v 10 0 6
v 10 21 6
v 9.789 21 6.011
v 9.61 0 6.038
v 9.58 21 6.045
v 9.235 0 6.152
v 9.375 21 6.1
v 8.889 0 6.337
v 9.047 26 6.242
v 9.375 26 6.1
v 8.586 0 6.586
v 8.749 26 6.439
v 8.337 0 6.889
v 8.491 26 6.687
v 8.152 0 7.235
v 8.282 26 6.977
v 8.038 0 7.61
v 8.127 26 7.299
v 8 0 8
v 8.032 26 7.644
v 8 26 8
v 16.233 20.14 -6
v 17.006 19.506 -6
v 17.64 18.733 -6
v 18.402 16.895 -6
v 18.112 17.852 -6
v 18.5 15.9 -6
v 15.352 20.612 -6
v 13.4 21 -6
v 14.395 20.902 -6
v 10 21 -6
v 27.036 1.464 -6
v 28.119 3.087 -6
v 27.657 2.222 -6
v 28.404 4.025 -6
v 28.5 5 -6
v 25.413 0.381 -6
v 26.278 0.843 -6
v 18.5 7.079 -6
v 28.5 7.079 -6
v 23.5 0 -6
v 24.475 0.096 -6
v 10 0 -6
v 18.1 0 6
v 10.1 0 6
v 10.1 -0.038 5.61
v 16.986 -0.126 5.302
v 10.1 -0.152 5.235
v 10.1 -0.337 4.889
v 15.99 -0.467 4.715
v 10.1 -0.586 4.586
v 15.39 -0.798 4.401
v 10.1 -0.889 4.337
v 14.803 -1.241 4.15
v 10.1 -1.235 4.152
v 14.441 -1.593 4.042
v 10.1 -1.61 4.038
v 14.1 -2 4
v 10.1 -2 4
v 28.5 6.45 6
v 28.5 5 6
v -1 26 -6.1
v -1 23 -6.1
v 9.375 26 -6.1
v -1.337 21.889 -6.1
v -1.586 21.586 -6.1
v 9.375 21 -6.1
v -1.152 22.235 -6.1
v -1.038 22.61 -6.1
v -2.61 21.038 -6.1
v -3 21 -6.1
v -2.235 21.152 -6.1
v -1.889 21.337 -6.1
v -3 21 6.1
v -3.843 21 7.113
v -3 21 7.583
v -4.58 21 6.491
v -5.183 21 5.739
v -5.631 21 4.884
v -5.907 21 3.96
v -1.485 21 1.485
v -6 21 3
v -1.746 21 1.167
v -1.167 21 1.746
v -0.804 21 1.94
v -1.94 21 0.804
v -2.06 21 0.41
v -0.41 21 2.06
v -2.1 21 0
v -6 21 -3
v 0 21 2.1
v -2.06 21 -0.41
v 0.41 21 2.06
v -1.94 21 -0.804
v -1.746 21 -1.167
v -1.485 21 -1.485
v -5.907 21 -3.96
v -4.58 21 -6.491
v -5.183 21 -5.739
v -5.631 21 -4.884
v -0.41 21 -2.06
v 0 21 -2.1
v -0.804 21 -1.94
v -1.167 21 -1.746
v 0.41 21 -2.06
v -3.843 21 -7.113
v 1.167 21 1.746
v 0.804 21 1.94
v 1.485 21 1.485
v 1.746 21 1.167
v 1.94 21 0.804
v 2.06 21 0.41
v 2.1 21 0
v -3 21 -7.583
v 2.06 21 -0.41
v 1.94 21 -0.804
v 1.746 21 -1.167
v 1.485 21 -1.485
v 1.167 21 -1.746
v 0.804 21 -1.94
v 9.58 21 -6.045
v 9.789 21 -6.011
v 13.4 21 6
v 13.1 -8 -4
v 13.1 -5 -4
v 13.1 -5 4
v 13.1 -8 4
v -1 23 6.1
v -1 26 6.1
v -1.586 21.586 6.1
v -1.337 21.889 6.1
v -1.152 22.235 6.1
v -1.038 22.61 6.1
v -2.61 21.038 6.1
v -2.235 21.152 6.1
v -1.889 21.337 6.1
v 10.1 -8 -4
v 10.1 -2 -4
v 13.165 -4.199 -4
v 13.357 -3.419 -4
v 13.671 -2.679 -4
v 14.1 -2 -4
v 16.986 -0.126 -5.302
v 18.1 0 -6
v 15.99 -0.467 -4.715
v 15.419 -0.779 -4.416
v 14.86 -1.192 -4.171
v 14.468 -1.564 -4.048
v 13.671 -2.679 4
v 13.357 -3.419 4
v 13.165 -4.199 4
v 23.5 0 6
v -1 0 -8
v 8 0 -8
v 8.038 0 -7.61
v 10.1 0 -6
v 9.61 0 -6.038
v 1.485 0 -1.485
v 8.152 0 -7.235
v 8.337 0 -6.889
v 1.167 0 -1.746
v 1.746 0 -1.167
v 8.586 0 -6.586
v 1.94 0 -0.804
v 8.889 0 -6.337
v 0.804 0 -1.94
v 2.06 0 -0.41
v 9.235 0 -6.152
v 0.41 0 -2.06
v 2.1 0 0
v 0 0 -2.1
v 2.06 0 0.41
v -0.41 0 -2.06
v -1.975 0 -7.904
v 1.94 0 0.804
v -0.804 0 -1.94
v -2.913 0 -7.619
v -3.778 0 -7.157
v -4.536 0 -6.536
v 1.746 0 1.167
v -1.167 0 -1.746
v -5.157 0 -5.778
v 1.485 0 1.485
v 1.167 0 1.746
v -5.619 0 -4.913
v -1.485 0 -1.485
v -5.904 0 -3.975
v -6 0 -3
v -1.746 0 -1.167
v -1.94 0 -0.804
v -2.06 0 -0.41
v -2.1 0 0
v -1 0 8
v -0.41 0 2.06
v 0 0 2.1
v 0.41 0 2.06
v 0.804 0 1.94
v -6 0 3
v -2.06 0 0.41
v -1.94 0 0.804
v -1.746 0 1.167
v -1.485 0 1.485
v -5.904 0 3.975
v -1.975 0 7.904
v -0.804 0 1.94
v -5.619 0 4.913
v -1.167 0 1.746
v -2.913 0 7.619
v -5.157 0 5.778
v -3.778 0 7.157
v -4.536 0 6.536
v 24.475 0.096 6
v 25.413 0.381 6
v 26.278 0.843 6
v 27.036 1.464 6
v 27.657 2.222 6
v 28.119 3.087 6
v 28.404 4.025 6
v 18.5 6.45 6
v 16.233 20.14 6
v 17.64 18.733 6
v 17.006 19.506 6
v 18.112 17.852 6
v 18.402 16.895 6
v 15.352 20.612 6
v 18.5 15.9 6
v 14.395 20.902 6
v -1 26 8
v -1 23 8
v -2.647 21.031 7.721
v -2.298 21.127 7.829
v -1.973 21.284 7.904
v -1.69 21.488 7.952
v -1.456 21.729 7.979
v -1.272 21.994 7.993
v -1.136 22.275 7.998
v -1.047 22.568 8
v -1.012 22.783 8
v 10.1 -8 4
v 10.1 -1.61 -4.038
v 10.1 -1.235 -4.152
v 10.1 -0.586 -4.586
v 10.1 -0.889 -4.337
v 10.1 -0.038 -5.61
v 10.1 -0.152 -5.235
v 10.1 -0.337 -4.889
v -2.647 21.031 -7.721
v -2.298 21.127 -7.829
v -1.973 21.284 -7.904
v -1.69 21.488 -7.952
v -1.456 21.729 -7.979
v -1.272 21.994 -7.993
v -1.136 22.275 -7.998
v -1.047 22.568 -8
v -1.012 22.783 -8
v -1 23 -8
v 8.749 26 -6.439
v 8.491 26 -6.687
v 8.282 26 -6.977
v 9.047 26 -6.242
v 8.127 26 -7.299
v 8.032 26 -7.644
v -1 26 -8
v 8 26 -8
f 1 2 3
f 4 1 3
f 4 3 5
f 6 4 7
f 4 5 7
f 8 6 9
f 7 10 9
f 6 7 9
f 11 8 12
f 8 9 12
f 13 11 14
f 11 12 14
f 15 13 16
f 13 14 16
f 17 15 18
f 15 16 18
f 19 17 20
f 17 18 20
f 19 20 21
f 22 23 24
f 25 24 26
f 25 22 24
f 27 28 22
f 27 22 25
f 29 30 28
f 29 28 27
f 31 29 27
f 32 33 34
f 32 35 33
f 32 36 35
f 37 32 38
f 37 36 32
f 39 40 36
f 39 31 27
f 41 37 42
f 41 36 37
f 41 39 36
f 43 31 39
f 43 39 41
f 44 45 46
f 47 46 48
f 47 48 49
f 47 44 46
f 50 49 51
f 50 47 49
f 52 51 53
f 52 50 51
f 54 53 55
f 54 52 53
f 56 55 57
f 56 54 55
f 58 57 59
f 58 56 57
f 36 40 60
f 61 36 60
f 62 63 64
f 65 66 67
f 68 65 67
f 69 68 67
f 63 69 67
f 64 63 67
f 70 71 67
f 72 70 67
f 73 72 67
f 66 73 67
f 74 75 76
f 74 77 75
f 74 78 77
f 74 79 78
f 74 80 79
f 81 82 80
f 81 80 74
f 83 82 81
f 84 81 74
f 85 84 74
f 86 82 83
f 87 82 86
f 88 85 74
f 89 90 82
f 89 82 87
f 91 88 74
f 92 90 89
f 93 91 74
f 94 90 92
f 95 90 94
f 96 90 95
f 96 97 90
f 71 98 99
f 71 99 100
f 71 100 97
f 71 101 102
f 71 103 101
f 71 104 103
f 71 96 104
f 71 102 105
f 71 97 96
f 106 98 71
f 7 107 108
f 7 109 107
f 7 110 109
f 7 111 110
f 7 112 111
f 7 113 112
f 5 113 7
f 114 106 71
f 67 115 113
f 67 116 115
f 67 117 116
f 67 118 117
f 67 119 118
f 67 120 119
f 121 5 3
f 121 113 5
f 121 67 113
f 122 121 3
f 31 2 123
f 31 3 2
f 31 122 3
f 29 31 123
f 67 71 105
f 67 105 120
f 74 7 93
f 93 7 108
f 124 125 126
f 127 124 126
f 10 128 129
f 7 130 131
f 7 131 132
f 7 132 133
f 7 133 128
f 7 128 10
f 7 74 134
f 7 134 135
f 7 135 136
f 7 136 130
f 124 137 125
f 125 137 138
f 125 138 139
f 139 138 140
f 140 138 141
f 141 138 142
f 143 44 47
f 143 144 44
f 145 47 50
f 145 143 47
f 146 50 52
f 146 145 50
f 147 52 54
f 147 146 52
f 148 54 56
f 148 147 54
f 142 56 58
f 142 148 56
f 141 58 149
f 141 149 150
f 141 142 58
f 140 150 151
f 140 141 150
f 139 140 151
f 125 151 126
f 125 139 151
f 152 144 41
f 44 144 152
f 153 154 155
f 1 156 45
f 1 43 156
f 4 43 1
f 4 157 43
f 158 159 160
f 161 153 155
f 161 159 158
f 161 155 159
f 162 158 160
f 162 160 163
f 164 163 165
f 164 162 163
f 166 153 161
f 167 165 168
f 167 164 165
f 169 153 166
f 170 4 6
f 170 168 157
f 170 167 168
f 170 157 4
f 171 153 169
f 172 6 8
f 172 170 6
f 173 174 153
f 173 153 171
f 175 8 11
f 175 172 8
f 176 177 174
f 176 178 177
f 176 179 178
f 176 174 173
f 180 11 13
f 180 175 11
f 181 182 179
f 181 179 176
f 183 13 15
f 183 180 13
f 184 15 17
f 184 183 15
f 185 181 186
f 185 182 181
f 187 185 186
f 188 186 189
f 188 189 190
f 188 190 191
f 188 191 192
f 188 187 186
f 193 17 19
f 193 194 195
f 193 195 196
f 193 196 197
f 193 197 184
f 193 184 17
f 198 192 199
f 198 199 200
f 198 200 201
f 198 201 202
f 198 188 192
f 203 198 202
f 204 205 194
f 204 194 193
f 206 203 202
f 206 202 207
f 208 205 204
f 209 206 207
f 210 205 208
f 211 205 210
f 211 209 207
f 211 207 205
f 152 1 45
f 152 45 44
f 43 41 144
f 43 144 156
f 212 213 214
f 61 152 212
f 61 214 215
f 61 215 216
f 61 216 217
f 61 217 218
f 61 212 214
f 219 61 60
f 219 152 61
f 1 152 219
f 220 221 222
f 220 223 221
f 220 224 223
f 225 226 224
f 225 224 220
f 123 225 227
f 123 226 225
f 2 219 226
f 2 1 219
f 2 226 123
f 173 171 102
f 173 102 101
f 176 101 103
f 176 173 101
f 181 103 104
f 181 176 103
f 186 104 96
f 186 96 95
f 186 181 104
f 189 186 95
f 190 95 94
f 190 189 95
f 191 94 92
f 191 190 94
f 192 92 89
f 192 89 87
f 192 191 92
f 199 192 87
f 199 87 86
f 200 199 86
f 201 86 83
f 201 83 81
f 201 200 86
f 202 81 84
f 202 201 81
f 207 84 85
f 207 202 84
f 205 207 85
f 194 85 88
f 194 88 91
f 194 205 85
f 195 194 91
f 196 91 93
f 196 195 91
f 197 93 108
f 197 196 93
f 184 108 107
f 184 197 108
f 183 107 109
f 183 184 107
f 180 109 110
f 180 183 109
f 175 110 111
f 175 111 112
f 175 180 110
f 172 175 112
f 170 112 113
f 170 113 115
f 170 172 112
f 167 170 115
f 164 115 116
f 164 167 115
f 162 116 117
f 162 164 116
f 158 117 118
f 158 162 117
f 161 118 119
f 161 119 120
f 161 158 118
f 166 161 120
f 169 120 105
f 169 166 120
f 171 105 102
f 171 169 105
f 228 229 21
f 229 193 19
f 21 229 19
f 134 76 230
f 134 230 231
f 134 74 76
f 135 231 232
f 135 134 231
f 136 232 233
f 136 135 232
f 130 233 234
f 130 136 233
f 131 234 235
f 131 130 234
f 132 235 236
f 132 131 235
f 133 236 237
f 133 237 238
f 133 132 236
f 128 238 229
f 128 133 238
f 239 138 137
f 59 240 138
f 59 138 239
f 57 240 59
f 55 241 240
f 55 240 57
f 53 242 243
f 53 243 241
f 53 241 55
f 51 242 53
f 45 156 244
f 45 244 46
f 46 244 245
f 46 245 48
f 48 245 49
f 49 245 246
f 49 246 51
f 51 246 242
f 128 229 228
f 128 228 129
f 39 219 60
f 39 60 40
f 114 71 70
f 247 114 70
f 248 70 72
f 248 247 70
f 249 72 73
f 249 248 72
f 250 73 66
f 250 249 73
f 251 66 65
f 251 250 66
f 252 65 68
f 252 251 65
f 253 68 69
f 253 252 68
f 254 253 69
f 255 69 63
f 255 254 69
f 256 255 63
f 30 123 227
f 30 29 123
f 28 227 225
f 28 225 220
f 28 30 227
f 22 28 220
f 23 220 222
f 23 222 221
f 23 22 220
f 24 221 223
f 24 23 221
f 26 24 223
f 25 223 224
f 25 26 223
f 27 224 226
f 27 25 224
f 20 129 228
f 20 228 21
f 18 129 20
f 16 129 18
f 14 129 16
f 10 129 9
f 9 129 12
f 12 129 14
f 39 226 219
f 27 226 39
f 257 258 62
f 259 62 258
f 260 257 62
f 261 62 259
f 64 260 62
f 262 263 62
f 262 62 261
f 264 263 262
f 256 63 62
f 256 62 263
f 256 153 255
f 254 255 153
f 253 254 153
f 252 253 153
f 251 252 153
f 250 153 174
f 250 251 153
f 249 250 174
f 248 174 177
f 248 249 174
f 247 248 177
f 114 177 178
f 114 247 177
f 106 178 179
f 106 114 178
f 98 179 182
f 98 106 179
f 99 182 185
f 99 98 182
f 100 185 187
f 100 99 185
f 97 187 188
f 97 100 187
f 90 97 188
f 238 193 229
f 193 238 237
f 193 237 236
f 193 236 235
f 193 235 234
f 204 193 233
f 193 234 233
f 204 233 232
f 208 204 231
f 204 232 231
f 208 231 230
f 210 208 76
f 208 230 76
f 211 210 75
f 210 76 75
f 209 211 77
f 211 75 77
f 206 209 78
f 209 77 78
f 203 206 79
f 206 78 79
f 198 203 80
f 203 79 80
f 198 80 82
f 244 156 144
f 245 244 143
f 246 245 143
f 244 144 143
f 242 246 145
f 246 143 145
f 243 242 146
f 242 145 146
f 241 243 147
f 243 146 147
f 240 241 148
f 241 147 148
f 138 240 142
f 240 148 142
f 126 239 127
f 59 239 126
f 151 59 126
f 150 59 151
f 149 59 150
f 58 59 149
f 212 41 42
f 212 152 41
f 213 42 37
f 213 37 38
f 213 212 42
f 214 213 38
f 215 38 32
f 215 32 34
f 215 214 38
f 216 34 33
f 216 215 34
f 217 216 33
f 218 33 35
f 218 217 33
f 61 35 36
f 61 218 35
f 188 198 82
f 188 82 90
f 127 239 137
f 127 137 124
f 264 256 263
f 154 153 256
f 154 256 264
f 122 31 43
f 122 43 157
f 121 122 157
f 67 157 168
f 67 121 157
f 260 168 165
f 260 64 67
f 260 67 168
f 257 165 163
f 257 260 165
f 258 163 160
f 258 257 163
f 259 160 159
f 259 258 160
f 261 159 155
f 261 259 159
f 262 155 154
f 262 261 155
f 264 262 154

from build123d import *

# Parameters (mm, degrees)
SKETCH1_W           = 12
SKETCH1_H           = 16
SKETCH1_R           = 2.1
SKETCH1_W_2         = 2
BOSS_EXTRUDE1_DEPTH = 21
FILLET1_R           = 5
SKETCH2_W           = 9
SKETCH2_H           = 1.9
BOSS_EXTRUDE2_DEPTH = 5
SKETCH4_W           = 12
SKETCH4_H           = 21
BOSS_EXTRUDE3_DEPTH = 10.5
FILLET2_R           = 5.1
FILLET4_R           = 2
SKETCH6_W           = 3
SKETCH6_H           = 8
BOSS_EXTRUDE5_DEPTH = 8
FILLET6_R           = 2
FILLET8_R           = 5
BOSS_EXTRUDE6_DEPTH = 10
FILLET9_R           = 5


with BuildPart() as part:
    # Sketch1 → Boss-Extrude1 (new body)
    # profile 1 of 2: a face of its own
    with BuildSketch(Plane(origin=(0, 0, 0), x_dir=(1, 0, 0), z_dir=(0, 1, 0))):
        Rectangle(SKETCH1_W, SKETCH1_H)
        with Locations(Location((0, 0, 0), (0, 0, 90))):
            Circle(SKETCH1_R, mode=Mode.SUBTRACT)
    # profile 2 of 2: a face of its own
    with BuildSketch(Plane(origin=(0, 0, 0), x_dir=(1, 0, 0), z_dir=(0, 1, 0))):
        with Locations((7, 0)):
            Rectangle(SKETCH1_W_2, SKETCH1_H)
    extrude(amount=BOSS_EXTRUDE1_DEPTH)

    # Fillet1
    fillet1_edges = [part.edges().sort_by_distance(p)[0] for p in [
        (-6, 10.5, 8),
        (-6, 10.5, -8),
    ]]
    fillet(fillet1_edges, radius=FILLET1_R)

    # Sketch2 → Boss-Extrude2 (add)
    with BuildSketch(Plane(origin=(0, 21, 0), x_dir=(1, 0, 0), z_dir=(0, 1, 0))):
        with Locations((3.5, 7.05)):
            Rectangle(SKETCH2_W, SKETCH2_H)
        with Locations((3.5, -7.05)):
            Rectangle(SKETCH2_W, SKETCH2_H)
    extrude(amount=BOSS_EXTRUDE2_DEPTH)

    # Sketch4 → Boss-Extrude3 (add)
    with BuildSketch(Plane(origin=(8, 0, 0), x_dir=(0, 0, -1), z_dir=(1, 0, 0))):
        with Locations((0, 10.5)):
            Rectangle(SKETCH4_W, SKETCH4_H)
    extrude(amount=BOSS_EXTRUDE3_DEPTH)

    # Fillet2
    fillet2_edges = [part.edges().sort_by_distance(p)[0] for p in [
        (18.5, 21, 0),
    ]]
    fillet(fillet2_edges, radius=FILLET2_R)

    # Fillet4
    fillet4_edges = [part.edges().sort_by_distance(p)[0] for p in [
        (-1, 21, -7.05),
        (-1, 21, 7.05),
        (8, 10.5, -6),
        (8, 10.5, 6),
    ]]
    fillet(fillet4_edges, radius=FILLET4_R - 0.0001)  # a hair under: the kernel refuses the full size

    # Sketch6 → Boss-Extrude5 (add)
    with BuildSketch(Plane.XZ):
        with Locations((11.6, 0)):
            Rectangle(SKETCH6_W, SKETCH6_H)
    extrude(amount=BOSS_EXTRUDE5_DEPTH)

    # Fillet6
    fillet6_edges = [part.edges().sort_by_distance(p)[0] for p in [
        (11.6, 0, -4),
        (11.6, 0, 4),
    ]]
    fillet(fillet6_edges, radius=FILLET6_R - 0.0001)  # a hair under: the kernel refuses the full size

    # Fillet8
    fillet8_edges = [part.edges().sort_by_distance(p)[0] for p in [
        (13.1, 0, 0),
    ]]
    fillet(fillet8_edges, radius=FILLET8_R)

    # Sketch7 → Boss-Extrude6 (add)
    with BuildSketch(Plane(origin=(18.5, 0, 0), x_dir=(0, 0, -1), z_dir=(1, 0, 0))):
        Polygon((-6, 0), (-6, 6.45), (6, 7.078893351), (6, 0), align=None)
    extrude(amount=BOSS_EXTRUDE6_DEPTH)

    # Fillet9
    fillet9_edges = [part.edges().sort_by_distance(p)[0] for p in [
        (28.5, 0, 0),
    ]]
    fillet(fillet9_edges, radius=FILLET9_R)


solid = part.part
